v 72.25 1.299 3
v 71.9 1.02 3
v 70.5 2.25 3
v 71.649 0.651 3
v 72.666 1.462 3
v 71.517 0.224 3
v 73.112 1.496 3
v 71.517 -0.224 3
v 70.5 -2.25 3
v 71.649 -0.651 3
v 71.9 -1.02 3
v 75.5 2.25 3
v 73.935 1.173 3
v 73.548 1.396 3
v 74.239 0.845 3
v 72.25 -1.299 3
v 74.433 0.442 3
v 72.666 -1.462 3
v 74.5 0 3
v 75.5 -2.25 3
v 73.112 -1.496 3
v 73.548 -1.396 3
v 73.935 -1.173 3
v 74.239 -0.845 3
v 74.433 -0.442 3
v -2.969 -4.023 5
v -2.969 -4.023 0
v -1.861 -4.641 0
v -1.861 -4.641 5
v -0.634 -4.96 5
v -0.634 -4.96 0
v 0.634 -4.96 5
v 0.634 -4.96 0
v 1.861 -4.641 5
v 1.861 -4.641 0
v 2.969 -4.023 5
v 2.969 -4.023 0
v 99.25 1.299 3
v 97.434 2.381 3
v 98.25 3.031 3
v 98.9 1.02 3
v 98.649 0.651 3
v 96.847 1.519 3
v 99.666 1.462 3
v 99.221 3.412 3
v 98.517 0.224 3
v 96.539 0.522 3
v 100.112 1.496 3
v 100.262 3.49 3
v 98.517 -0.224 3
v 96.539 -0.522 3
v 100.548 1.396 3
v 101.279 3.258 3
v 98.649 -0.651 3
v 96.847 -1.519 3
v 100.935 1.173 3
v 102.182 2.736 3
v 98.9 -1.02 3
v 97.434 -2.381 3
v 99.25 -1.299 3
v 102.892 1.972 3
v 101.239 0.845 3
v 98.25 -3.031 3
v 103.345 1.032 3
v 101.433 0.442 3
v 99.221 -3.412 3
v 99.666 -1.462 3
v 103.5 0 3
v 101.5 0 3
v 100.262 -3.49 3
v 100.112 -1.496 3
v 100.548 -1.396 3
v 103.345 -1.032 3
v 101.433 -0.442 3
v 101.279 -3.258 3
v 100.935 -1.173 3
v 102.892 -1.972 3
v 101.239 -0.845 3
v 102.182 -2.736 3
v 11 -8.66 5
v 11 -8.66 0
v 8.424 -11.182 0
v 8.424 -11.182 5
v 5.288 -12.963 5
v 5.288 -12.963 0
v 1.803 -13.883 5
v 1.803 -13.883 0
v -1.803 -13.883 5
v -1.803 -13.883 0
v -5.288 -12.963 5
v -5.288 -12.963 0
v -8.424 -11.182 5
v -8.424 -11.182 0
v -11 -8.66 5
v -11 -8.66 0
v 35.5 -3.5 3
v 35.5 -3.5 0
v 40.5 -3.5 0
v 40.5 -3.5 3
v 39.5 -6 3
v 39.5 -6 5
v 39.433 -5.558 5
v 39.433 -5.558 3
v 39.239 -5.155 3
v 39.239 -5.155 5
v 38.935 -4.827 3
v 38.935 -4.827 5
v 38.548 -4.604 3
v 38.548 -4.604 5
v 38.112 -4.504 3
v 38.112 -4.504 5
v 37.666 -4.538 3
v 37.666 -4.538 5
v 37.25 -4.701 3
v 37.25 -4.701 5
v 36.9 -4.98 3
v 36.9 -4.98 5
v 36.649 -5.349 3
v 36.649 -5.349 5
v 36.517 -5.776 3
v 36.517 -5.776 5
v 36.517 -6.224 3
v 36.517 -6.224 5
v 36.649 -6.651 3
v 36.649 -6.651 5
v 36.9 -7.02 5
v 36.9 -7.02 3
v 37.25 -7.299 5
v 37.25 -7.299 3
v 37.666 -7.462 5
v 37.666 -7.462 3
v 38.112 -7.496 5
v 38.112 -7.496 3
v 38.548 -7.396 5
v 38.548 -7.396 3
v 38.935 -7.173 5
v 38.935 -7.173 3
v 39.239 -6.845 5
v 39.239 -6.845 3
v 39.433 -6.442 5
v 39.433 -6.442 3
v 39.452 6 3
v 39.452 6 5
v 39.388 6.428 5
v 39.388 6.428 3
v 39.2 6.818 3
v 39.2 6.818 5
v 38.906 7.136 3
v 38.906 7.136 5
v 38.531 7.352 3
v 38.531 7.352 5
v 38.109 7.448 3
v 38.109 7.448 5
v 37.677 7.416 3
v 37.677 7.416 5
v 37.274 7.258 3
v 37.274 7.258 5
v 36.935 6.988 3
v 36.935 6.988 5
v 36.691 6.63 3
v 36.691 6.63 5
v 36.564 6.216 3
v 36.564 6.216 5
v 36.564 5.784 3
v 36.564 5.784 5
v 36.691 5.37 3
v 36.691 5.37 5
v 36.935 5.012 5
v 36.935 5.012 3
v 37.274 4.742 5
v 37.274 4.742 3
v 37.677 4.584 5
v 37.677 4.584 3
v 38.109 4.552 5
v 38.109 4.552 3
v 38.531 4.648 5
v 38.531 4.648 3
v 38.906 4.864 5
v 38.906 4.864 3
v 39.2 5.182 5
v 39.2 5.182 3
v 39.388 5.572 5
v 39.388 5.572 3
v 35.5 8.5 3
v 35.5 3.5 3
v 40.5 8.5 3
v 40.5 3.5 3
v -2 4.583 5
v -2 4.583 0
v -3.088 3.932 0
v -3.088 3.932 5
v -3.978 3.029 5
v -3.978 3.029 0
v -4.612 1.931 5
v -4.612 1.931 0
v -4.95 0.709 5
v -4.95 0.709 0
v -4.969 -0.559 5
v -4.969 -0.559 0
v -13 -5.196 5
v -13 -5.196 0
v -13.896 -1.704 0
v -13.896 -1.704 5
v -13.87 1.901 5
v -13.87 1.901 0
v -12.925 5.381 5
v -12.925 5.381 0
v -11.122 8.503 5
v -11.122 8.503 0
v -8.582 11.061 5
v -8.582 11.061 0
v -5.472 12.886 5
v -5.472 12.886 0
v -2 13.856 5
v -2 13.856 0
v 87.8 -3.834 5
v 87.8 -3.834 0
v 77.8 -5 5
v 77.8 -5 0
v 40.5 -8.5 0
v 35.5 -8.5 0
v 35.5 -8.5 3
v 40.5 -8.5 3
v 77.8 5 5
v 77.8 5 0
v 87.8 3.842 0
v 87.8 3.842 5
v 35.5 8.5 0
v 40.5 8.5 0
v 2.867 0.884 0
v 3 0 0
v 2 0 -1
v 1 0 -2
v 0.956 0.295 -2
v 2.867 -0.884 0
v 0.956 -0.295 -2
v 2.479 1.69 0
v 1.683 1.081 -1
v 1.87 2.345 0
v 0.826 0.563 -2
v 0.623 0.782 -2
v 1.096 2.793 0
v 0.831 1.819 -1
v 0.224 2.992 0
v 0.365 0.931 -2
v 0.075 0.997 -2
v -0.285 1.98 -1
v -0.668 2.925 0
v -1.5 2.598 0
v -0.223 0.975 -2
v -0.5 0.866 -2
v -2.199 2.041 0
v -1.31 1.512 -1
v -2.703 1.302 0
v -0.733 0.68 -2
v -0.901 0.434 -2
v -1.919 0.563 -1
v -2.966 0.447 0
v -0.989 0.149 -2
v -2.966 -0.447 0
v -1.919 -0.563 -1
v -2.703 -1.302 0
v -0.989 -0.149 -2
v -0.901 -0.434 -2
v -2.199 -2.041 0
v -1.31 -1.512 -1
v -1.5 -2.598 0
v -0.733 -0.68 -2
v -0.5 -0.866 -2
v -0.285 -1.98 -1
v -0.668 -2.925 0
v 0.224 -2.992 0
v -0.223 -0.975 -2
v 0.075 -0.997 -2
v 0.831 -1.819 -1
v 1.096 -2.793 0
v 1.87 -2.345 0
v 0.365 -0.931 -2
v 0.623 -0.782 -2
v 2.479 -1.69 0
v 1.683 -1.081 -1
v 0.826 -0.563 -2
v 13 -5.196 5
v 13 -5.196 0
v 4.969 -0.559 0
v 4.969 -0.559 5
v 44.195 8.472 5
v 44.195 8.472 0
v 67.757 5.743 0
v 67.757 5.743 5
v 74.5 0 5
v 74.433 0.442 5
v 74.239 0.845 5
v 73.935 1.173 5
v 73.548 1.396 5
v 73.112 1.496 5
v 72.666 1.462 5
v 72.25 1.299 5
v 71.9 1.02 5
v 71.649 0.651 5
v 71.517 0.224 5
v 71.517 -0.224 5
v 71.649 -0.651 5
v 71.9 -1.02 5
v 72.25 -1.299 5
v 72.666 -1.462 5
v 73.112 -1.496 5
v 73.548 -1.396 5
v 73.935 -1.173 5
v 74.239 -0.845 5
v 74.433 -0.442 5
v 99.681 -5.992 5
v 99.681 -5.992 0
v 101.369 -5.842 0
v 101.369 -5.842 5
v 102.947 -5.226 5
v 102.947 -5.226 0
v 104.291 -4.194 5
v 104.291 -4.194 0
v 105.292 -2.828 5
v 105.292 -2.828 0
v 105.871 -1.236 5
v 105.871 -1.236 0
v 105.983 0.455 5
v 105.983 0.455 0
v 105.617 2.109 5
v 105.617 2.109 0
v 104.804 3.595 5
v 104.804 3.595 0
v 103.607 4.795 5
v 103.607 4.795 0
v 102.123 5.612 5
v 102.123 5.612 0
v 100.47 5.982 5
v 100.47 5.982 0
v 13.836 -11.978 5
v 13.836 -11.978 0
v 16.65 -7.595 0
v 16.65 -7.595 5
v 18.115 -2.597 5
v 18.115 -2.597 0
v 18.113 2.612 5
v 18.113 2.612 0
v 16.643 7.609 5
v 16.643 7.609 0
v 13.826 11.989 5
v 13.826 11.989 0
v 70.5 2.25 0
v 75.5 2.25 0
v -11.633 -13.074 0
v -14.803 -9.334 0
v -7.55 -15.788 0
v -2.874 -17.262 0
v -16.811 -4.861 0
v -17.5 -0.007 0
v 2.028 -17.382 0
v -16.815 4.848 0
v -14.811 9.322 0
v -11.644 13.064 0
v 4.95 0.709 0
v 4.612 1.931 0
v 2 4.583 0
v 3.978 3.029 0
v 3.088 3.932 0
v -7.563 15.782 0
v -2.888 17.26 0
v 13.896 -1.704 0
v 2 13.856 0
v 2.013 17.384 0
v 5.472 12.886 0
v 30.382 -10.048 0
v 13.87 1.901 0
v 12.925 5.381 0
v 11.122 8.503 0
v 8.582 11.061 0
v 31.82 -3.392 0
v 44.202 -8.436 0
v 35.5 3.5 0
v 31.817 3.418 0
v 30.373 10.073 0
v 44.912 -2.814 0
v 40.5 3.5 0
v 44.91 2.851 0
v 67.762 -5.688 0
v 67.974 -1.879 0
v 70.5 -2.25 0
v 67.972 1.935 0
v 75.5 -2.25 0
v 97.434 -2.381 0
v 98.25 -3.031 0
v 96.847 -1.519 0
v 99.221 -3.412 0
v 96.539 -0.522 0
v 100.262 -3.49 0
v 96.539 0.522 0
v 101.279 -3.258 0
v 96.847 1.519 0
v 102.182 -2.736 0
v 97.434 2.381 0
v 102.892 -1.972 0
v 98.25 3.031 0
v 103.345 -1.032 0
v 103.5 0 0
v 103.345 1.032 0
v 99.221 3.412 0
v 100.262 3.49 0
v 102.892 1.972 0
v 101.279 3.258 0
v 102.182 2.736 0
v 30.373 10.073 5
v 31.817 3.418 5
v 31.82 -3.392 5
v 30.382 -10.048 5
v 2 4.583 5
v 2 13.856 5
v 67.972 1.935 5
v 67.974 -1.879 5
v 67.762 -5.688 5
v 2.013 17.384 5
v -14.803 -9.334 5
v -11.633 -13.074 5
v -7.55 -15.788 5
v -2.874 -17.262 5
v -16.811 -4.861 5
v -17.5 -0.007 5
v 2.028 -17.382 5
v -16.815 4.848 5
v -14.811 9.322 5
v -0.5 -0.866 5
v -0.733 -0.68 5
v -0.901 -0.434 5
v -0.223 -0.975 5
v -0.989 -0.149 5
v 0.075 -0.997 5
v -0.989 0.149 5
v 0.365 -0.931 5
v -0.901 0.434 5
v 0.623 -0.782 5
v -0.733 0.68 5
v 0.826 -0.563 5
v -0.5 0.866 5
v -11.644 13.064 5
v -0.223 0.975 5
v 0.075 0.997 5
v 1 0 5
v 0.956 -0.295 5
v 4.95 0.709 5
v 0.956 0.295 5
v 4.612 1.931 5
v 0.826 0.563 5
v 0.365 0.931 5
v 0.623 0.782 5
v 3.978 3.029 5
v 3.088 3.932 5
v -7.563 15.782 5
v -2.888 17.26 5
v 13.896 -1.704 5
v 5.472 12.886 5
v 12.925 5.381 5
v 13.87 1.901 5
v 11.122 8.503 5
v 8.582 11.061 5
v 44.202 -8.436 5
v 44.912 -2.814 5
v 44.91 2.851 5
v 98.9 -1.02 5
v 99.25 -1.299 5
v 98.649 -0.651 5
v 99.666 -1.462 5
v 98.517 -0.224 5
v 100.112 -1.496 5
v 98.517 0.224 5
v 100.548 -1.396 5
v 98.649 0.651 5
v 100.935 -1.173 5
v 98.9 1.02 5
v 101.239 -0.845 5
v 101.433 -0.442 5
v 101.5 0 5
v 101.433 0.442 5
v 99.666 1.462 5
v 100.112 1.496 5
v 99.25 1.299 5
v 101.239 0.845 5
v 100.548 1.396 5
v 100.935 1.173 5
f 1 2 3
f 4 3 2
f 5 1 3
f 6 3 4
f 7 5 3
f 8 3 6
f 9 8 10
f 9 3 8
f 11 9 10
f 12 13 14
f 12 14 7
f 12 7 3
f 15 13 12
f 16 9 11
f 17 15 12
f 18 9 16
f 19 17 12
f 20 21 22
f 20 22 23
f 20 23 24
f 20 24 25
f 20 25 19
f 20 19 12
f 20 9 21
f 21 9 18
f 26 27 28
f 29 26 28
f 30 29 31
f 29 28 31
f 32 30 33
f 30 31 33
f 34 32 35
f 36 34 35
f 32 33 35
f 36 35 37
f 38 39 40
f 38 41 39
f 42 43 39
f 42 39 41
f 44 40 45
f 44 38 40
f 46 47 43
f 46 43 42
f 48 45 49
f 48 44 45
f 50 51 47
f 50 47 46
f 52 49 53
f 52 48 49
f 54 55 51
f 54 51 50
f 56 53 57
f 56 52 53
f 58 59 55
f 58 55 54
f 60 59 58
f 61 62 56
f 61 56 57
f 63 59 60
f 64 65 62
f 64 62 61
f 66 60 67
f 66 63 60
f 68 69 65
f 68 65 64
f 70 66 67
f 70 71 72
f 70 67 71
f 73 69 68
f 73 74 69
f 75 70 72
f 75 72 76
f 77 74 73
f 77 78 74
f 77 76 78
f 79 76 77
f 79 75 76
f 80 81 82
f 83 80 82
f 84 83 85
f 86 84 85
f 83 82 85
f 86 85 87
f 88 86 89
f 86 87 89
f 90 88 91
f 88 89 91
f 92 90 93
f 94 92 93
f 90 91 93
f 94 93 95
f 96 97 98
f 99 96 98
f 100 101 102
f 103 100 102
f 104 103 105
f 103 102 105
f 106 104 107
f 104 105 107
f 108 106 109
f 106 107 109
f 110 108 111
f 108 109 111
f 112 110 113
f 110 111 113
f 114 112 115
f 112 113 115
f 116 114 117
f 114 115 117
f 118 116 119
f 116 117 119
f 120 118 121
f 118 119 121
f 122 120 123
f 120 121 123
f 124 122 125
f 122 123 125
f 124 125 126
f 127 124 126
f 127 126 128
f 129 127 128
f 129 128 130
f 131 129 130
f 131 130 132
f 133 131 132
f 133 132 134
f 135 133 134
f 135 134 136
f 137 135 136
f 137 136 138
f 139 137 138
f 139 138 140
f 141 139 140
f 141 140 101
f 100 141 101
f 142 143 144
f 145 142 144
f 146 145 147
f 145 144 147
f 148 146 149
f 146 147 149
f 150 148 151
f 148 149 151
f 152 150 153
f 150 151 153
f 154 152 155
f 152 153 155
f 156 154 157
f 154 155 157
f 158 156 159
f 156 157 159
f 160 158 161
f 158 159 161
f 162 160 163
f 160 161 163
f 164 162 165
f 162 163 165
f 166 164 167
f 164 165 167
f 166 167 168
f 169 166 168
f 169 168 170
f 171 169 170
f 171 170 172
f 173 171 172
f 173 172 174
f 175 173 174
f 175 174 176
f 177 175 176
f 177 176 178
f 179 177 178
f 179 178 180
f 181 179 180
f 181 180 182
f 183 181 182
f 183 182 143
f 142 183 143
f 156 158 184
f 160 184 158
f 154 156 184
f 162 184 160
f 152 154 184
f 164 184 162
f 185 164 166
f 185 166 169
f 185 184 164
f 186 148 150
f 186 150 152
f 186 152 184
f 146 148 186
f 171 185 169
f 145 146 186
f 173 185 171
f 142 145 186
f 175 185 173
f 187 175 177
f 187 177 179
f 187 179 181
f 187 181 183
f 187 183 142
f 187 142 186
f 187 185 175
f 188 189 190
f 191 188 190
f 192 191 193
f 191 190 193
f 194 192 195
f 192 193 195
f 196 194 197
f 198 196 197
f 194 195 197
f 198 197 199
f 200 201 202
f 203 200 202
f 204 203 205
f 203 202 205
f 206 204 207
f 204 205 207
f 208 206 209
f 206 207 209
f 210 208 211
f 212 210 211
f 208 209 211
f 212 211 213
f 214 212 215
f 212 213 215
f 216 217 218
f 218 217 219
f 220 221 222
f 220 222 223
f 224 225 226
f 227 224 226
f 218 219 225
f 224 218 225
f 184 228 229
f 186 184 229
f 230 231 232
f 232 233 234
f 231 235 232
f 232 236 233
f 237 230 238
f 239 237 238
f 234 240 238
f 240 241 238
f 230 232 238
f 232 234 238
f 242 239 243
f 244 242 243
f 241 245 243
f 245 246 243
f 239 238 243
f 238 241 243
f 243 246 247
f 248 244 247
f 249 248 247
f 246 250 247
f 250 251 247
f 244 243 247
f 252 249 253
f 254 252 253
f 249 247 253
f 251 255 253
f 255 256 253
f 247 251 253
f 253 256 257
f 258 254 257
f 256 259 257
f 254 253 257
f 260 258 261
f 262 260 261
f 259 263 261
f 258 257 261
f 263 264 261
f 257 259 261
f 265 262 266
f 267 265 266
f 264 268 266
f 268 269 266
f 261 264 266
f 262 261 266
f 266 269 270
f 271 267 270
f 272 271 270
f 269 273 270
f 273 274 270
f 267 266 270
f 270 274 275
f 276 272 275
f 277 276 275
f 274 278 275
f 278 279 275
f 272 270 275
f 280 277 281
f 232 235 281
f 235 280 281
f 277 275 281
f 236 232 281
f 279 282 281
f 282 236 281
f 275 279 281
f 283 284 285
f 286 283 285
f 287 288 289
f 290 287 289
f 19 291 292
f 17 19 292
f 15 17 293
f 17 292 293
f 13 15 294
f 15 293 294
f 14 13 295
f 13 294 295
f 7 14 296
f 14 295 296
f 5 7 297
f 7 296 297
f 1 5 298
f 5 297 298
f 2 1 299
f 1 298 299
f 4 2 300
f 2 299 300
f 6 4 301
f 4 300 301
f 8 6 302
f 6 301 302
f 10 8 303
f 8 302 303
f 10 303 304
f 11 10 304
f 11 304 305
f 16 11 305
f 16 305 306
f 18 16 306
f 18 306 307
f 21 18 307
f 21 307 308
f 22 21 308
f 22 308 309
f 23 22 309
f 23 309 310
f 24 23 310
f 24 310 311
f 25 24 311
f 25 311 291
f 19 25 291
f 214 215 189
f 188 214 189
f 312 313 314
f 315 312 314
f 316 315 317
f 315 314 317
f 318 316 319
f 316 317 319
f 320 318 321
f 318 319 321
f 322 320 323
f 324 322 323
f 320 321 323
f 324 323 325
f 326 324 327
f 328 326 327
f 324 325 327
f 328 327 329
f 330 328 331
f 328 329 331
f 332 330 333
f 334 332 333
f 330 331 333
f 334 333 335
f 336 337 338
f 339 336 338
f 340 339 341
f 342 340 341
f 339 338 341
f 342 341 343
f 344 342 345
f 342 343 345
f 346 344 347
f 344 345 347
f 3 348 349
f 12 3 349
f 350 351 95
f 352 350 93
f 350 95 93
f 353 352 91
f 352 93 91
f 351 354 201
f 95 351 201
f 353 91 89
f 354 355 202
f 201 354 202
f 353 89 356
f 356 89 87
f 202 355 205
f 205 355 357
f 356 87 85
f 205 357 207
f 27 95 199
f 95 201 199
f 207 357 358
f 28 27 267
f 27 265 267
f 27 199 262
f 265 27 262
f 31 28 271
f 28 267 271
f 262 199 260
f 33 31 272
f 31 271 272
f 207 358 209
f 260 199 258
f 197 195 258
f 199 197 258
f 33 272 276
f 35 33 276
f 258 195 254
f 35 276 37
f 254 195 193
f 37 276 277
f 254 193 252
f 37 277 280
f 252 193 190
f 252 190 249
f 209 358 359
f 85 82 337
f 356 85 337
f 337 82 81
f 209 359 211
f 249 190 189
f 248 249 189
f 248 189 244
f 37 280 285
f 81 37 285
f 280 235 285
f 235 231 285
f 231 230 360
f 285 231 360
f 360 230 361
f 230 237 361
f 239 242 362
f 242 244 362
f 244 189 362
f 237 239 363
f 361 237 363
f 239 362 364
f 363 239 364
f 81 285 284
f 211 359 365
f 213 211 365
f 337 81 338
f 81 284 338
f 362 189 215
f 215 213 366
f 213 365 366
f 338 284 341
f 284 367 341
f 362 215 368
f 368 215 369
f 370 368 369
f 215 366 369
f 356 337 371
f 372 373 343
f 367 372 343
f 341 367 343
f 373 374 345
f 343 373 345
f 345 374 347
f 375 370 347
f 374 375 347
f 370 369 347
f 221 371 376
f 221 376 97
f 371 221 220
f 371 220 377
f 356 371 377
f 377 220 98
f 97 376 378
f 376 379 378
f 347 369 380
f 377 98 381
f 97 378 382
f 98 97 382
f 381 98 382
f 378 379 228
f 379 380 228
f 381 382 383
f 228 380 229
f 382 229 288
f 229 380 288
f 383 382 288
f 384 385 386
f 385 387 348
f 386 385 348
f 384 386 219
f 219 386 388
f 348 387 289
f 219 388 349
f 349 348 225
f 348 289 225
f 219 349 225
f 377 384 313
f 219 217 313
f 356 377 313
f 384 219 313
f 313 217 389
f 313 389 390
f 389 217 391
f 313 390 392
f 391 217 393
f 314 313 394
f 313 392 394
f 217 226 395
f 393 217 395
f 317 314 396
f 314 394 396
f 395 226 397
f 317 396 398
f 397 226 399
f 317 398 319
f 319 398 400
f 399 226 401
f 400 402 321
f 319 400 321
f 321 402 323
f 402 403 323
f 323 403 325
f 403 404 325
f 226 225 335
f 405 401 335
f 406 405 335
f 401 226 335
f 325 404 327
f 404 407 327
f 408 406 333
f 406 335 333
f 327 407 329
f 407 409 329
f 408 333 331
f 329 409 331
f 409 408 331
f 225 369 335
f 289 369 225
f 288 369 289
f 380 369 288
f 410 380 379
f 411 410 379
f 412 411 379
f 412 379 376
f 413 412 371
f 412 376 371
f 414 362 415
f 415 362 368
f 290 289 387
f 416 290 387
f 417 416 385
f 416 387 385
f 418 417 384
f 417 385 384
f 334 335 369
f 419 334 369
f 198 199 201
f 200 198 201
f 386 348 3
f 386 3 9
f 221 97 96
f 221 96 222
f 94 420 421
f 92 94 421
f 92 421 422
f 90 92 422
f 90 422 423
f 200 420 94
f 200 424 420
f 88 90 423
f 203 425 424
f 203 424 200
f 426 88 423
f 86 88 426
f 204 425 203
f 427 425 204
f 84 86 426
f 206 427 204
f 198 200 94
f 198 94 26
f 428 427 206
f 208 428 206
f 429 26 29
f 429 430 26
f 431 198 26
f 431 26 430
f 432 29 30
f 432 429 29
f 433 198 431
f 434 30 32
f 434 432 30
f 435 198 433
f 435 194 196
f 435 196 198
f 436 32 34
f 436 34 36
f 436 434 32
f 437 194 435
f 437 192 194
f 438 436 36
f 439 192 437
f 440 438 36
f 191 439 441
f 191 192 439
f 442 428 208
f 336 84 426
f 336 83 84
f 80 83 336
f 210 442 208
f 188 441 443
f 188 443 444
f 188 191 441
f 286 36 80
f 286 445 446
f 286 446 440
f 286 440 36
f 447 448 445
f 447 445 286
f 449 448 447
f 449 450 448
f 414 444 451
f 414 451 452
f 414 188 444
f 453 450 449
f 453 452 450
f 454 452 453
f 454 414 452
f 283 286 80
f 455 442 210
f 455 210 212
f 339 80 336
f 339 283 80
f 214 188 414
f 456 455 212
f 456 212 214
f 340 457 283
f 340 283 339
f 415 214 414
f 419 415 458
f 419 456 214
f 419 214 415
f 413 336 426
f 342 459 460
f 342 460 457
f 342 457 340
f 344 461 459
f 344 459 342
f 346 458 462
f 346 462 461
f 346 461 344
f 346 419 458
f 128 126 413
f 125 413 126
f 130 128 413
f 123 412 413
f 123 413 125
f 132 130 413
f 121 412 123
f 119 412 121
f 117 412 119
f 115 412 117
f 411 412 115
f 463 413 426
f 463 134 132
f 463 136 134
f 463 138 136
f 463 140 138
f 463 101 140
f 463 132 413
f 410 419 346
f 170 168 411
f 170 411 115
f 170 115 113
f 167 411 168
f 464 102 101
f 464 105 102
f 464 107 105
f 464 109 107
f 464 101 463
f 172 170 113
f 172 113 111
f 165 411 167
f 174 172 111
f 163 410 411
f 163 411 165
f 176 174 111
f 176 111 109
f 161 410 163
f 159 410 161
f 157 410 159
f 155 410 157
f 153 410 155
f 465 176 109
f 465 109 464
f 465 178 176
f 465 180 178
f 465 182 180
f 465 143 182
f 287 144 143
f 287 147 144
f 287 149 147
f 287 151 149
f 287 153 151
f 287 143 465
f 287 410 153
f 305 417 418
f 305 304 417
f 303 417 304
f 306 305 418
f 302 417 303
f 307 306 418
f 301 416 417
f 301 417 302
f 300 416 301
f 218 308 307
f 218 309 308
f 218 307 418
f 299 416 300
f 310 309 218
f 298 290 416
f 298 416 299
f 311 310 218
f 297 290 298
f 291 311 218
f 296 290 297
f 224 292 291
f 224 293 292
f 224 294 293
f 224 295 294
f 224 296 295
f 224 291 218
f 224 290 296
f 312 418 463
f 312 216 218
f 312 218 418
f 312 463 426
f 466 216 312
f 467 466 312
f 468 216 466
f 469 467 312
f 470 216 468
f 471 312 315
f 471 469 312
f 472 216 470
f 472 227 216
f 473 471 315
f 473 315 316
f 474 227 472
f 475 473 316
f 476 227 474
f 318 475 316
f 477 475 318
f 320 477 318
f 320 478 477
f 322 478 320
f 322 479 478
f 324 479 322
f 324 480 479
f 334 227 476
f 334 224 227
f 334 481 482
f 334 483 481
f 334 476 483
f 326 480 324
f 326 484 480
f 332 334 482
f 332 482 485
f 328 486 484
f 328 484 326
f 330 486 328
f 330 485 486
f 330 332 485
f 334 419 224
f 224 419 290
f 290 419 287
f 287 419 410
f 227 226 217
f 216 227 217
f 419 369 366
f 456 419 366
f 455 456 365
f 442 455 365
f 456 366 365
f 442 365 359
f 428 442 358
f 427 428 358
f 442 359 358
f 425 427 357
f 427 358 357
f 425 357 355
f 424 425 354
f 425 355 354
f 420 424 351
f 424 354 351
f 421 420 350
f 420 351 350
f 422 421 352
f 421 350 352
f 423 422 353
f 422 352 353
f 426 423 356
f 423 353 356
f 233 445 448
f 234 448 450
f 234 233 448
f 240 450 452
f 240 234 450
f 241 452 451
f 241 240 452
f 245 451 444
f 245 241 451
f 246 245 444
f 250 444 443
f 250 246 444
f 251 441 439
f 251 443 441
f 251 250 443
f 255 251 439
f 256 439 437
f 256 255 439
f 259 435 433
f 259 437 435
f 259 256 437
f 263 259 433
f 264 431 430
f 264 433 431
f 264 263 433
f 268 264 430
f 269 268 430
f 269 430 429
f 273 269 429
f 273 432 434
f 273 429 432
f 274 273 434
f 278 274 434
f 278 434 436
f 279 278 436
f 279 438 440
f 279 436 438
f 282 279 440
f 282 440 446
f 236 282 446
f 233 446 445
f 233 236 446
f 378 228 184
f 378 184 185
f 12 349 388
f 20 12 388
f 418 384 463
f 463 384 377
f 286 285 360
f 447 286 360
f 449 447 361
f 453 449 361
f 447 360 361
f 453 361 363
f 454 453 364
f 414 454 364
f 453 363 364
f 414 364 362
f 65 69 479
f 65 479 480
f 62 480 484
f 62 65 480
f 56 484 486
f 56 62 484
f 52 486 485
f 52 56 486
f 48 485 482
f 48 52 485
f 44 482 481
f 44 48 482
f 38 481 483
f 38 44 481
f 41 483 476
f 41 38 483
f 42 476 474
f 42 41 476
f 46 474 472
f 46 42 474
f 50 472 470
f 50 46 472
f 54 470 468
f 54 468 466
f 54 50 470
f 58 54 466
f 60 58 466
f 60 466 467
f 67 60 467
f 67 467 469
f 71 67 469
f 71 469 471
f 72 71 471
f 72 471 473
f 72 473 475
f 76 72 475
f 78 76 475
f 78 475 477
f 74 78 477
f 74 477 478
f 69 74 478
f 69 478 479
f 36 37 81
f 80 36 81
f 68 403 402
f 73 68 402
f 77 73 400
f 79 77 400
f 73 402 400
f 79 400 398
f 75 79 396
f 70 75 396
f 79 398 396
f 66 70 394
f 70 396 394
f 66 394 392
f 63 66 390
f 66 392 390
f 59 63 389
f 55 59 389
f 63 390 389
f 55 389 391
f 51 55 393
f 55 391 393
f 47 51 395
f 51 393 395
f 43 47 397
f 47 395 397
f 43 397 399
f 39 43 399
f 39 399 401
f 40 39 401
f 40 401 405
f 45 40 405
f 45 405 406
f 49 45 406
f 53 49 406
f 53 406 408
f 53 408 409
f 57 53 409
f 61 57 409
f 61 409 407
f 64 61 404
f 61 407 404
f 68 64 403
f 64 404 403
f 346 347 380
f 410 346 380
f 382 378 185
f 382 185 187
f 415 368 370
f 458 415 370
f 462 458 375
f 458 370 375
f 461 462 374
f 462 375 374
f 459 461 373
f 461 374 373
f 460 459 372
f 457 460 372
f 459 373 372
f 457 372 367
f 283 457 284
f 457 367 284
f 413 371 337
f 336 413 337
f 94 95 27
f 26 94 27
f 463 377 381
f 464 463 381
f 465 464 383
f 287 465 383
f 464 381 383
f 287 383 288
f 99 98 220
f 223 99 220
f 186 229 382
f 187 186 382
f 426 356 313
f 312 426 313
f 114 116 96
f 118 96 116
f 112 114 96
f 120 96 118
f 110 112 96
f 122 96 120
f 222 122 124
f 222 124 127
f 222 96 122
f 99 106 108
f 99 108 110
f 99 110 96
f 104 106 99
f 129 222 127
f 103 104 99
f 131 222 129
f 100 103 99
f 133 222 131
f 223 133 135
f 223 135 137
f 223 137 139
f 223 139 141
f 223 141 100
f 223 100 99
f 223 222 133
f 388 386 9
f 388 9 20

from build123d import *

# Parameters (mm, degrees)
F0_R     = 1.5
F1_DEPTH = 5
F2_W     = 5
F2_H     = 5
F2_H_2   = 4.5
F2_R     = 3.5
F3_DEPTH = 3
F4_R     = 1.5
F4_R_2   = 1.4524317573
F5_DEPTH = 25
F6_R     = 3
F7_DEPTH = 7
F8_SIZE  = 1.99999
F9_DEPTH = 25


# Not quite as in the source:
# - a fillet or chamfer is up to 0.001 mm smaller than in the source, because OpenCascade refuses the exact size


with BuildPart() as f1:
    # F0 (on Top) → F1 (new body)
    with BuildSketch(Plane.XY):
        with BuildLine():
            Line((100.4699678509, 5.9815658668), (2.0132142916, 17.3838133968))
            ThreePointArc((2.0132142916, 17.3838133968), (-17.4999985209, -0.0071949455), (2.027507963, -17.3821520952))
            Line((2.027507963, -17.3821520952), (99.6811939192, -5.991524237))
            ThreePointArc((99.6811939192, -5.991524237), (105.987022142, -0.394418396), (100.4699678509, 5.9815658668))
        make_face()
        with BuildLine():
            Line((-11, -8.6602540378), (-2.9686269666, -4.023338655))
            ThreePointArc((-2.9686269666, -4.023338655), (0, -5), (2.9686269666, -4.023338655))
            Line((2.9686269666, -4.023338655), (11, -8.6602540378))
            ThreePointArc((11, -8.6602540378), (0, -14), (-11, -8.6602540378))
        make_face(mode=Mode.SUBTRACT)
        with BuildLine():
            ThreePointArc((-13, -5.1961524227), (-12.124355653, 7), (-2, 13.8564064606))
            Line((-2, 13.8564064606), (-2, 4.582575695))
            ThreePointArc((-2, 4.582575695), (-4.3301270189, 2.5), (-4.9686269666, -0.5592370399))
            Line((-4.9686269666, -0.5592370399), (-13, -5.1961524227))
        make_face(mode=Mode.SUBTRACT)
        Circle(F0_R, mode=Mode.SUBTRACT)
        with BuildLine():
            Line((2, 4.582575695), (2, 13.8564064606))
            ThreePointArc((2, 13.8564064606), (12.124355653, 7), (13, -5.1961524227))
            Line((13, -5.1961524227), (4.9686269666, -0.5592370399))
            ThreePointArc((4.9686269666, -0.5592370399), (4.3301270189, 2.5), (2, 4.582575695))
        make_face(mode=Mode.SUBTRACT)
        with BuildLine():
            Line((30.3816278502, -10.0477205958), (13.8356347618, -11.9776963869))
            ThreePointArc((13.8356347618, -11.9776963869), (18.2999984533, 0.0075238573), (13.8257810711, 11.9890690954))
            Line((13.8257810711, 11.9890690954), (30.3733555452, 10.0726993863))
            ThreePointArc((30.3733555452, 10.0726993863), (31.9999972954, 0.0131564719), (30.3816278502, -10.0477205958))
        make_face(mode=Mode.SUBTRACT)
        with BuildLine():
            Line((67.7617245486, -5.6875905441), (44.2022623135, -8.435639061))
            ThreePointArc((44.2022623135, -8.435639061), (44.9999961967, 0.0185012885), (44.1953109176, 8.4719828198))
            Line((44.1953109176, 8.4719828198), (67.7570248516, 5.743307693))
            ThreePointArc((67.7570248516, 5.743307693), (67.9999942528, 0.0279575027), (67.7617245486, -5.6875905441))
        make_face(mode=Mode.SUBTRACT)
        Polygon((77.8001793809, -5), (77.8001793809, 5), (87.8001793809, 3.8419029556), (87.8001793809, -3.8335690817), align=None, mode=Mode.SUBTRACT)
        with Locations((100, 0)):
            Circle(F0_R, mode=Mode.SUBTRACT)
    extrude(amount=F1_DEPTH)

    # F2 (on face) → F3 (cut)
    with BuildSketch(Plane(origin=(0, 0, 0), x_dir=(1, 0, 0), z_dir=(0, 0, -1))):
        with Locations((38, 6)):
            Rectangle(F2_W, F2_H)
        with Locations((73, 0)):
            Rectangle(F2_W, F2_H_2)
        with Locations((38, -6)):
            Rectangle(F2_W, F2_H)
        with Locations((100, 0)):
            Circle(F2_R)
    extrude(amount=-F3_DEPTH, mode=Mode.SUBTRACT)

    # F4 (on face) → F5 (cut)
    with BuildSketch(Plane.XY.offset(5)):
        with Locations((38, -6)):
            Circle(F4_R)
        with Locations((73, 0)):
            Circle(F4_R)
        with Locations((38, 6)):
            Circle(F4_R_2)
    extrude(amount=-F5_DEPTH, mode=Mode.SUBTRACT)

    # F6 (on face) → F7 (join)
    with BuildSketch(Plane.XY.offset(5)):
        Circle(F6_R)
    extrude(amount=-F7_DEPTH)

    # F8 (size 2 in the source; OpenCascade refuses exactly that, so slightly less here)
    f8_edges = [f1.edges().sort_by_distance(p)[0] for p in [
        (-3, 0, -2),
    ]]
    chamfer(f8_edges, length=F8_SIZE)

    # F9 (cut): a face of the model
    f9_faces = [f1.faces().sort_by_distance(p)[0] for p in [
        (0, 0, -2),
    ]]
    extrude(f9_faces, amount=-F9_DEPTH, mode=Mode.SUBTRACT)


solid = f1.part
